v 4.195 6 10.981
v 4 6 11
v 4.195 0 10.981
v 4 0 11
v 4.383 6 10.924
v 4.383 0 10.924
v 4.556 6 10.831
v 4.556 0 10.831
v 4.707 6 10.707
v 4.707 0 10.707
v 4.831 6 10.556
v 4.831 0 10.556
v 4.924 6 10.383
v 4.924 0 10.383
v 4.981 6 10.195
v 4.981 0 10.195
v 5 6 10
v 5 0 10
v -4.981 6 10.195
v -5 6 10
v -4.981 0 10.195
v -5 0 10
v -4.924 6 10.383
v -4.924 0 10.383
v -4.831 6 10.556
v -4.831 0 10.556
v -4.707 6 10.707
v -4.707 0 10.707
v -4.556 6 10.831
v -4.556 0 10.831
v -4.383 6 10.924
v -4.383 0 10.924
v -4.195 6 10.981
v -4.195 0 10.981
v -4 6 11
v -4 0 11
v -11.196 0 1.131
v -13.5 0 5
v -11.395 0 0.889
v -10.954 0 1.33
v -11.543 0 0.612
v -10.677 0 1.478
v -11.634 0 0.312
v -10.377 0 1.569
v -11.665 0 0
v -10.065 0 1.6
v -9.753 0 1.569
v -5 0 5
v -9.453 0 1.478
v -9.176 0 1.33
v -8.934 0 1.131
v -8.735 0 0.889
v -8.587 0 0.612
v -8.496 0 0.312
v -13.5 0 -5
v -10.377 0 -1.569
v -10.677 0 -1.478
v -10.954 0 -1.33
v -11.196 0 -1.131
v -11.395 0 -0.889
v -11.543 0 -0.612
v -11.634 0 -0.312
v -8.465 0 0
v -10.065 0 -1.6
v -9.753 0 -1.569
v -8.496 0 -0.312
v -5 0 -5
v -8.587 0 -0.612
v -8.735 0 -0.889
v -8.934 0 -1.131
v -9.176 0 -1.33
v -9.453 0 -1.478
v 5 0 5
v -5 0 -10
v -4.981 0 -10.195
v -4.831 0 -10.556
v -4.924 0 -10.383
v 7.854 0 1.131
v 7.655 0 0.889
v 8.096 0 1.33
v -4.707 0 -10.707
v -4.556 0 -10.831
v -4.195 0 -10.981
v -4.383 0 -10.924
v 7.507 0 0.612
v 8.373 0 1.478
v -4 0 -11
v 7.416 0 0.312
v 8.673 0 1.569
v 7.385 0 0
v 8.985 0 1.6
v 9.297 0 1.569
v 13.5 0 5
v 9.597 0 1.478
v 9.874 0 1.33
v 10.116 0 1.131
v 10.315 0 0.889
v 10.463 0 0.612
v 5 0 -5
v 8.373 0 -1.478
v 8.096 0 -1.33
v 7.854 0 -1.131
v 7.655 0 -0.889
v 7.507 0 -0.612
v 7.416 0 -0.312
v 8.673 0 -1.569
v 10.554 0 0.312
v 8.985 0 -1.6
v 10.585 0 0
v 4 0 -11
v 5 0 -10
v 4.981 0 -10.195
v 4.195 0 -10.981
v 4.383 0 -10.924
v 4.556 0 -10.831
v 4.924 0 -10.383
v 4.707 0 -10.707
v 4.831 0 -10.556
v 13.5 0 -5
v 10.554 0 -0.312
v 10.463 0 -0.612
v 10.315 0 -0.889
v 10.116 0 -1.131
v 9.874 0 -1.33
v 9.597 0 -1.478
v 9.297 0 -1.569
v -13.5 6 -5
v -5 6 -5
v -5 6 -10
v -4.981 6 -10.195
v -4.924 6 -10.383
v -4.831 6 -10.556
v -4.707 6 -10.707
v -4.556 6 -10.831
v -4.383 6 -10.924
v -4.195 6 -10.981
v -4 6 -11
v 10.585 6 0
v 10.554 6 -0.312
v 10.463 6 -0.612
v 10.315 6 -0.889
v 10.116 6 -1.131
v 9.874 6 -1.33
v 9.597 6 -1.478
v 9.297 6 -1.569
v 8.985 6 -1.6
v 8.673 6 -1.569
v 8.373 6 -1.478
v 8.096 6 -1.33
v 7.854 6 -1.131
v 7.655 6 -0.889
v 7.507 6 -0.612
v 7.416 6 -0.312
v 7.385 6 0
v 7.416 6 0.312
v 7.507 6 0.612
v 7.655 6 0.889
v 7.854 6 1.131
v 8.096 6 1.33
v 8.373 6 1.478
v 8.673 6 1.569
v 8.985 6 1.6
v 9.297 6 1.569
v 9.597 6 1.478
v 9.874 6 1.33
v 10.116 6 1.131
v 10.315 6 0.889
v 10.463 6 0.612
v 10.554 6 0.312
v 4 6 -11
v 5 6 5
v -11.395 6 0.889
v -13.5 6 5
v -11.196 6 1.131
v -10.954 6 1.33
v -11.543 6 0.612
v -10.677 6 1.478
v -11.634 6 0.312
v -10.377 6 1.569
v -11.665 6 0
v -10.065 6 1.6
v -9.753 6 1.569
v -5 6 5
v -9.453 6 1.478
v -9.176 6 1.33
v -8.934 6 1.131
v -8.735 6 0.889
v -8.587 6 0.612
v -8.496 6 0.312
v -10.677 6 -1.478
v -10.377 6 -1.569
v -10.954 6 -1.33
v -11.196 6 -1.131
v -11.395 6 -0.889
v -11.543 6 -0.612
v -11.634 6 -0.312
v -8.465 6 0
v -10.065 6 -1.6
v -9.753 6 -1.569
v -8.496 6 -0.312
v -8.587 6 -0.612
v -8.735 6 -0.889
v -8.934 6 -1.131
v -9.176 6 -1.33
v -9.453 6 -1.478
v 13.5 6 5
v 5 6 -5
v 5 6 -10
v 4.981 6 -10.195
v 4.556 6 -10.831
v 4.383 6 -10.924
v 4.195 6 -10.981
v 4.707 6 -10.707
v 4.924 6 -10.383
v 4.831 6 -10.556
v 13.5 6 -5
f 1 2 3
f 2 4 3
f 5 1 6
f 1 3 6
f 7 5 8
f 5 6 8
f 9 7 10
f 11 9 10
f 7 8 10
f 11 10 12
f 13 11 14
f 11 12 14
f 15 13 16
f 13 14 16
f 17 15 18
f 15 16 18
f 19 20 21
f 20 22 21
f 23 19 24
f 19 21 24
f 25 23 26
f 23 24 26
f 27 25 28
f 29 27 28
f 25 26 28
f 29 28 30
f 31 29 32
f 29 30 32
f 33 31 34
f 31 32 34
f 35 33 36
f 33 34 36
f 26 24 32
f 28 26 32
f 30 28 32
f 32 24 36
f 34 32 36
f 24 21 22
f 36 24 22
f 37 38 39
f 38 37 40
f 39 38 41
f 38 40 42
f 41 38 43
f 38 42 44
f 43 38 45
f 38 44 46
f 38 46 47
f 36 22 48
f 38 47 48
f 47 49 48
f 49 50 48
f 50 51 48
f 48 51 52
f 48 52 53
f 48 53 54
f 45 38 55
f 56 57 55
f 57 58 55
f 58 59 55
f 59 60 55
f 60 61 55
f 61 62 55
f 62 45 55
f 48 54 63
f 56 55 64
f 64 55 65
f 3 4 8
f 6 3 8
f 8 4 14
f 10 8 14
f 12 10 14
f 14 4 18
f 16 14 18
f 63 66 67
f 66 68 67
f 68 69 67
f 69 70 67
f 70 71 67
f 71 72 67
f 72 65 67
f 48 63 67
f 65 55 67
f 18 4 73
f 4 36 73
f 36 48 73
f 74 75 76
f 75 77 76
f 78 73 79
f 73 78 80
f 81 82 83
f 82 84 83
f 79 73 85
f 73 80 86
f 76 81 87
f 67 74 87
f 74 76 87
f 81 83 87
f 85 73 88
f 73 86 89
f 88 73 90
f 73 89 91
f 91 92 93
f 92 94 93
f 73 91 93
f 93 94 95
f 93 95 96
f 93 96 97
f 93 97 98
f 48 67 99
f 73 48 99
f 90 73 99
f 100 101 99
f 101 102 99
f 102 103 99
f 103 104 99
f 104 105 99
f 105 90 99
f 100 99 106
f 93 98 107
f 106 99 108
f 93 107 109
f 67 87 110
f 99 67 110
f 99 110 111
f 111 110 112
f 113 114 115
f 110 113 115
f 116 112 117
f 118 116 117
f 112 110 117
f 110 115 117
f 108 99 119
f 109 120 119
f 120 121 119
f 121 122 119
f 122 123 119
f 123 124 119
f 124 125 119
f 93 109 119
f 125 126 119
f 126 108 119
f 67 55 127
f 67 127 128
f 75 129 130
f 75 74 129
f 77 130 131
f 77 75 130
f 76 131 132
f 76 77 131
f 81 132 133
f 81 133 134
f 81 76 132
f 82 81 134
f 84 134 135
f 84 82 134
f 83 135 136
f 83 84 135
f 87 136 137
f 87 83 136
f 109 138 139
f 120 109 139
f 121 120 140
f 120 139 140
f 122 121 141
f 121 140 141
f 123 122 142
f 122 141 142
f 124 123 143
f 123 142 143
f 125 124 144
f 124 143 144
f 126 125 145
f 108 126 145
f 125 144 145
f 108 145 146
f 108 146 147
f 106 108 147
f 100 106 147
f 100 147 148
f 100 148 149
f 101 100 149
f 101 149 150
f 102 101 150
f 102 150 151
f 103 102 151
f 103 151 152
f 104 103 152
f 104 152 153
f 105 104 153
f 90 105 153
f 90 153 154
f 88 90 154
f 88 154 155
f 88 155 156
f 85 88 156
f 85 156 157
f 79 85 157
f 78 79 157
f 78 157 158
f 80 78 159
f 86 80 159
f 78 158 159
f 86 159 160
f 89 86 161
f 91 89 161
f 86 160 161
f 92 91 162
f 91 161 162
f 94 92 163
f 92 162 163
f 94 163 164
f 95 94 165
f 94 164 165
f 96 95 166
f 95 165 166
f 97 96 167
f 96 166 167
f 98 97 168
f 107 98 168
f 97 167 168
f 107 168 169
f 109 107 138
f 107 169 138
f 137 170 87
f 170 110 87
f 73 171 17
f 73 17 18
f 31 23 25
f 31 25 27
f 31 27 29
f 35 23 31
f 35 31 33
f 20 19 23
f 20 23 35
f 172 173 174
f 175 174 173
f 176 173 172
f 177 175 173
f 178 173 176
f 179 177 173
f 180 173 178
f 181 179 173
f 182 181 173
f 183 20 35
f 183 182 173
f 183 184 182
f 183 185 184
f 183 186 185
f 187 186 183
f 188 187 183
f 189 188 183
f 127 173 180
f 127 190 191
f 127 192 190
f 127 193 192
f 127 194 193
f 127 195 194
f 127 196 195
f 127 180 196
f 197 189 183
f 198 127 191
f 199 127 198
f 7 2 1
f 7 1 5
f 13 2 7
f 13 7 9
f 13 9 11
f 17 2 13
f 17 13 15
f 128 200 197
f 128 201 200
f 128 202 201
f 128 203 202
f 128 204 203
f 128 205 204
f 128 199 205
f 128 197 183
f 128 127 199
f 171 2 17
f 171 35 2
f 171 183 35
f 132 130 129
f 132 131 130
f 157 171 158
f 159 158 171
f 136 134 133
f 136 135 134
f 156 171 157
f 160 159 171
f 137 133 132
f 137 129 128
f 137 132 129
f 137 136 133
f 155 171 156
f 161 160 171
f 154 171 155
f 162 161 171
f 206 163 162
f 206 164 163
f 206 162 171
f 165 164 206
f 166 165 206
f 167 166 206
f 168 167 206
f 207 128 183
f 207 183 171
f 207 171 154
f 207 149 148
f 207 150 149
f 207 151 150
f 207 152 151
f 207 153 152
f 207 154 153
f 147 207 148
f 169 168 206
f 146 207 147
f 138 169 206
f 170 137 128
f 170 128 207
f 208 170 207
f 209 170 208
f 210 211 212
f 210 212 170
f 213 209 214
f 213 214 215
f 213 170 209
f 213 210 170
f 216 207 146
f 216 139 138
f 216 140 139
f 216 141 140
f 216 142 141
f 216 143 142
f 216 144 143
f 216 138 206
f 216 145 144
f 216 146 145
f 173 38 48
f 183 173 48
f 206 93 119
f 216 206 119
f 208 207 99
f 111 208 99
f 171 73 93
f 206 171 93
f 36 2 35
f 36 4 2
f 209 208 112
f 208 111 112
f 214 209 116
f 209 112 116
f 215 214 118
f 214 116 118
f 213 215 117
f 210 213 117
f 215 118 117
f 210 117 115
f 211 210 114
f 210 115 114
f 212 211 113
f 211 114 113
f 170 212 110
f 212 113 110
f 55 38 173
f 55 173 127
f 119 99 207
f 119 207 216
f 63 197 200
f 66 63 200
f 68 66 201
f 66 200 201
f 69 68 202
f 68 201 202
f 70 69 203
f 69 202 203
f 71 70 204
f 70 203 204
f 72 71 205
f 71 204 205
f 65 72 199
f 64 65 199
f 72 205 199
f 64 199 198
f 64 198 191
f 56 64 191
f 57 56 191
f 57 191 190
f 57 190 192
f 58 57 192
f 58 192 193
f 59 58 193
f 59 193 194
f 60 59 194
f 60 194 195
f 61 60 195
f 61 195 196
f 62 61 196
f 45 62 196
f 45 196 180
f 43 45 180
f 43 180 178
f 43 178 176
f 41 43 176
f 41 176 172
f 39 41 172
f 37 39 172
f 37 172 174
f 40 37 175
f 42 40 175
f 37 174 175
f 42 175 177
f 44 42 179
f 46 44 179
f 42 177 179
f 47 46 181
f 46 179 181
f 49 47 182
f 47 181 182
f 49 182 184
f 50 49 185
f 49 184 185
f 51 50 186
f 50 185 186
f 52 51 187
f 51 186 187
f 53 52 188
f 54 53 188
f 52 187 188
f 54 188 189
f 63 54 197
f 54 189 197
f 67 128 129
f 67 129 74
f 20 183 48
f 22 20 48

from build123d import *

# Parameters (mm, degrees)
SKETCH1_W              = 27
SKETCH1_H              = 10
BOSS_EXTRUDE1_DEPTH    = 6
M3_CLEARANCE_HOLE1_D   = 3.2
SKETCH234_W            = 10
SKETCH234_H            = 6
BOSS_EXTRUDE234_DEPTH  = 6
FILLET134_R            = 1
FILLET134_OF_MIRROR1_R = 1


with BuildPart() as part:
    # Sketch1 → Boss-Extrude1 (new body)
    with BuildSketch(Plane(origin=(0, 0, 0), x_dir=(1, 0, 0), z_dir=(0, 1, 0))):
        Rectangle(SKETCH1_W, SKETCH1_H)
    extrude(amount=BOSS_EXTRUDE1_DEPTH)

    # M3 Clearance Hole1 (through all)
    with Locations(Plane(origin=(0, 0, 0), x_dir=(-1, 0, 0), z_dir=(0, -1, 0))):
        with Locations((10.065, 0), (-8.985, 0)):
            Hole(M3_CLEARANCE_HOLE1_D / 2)

    # Sketch234 → Boss-Extrude234 (add)
    with BuildSketch(Plane(origin=(0.767778608, 6, 5), x_dir=(-1, 0, 0), z_dir=(0, 0, 1))):
        with Locations((0.767778608, 3)):
            Rectangle(SKETCH234_W, SKETCH234_H)
    boss_extrude234 = extrude(amount=BOSS_EXTRUDE234_DEPTH)

    # Fillet134
    fillet134_edges = [part.edges().sort_by_distance(p)[0] for p in [
        (5, 3, 11),
        (-5, 3, 11),
    ]]
    fillet(fillet134_edges, radius=FILLET134_R)

    # Mirror1: Boss-Extrude234 across plane
    add(boss_extrude234.mirror(Plane.XY))

    # Fillet134 of Mirror1
    fillet134_of_mirror1_edges = [part.edges().sort_by_distance(p)[0] for p in [
        (5, 3, -11),
        (-5, 3, -11),
    ]]
    fillet(fillet134_of_mirror1_edges, radius=FILLET134_OF_MIRROR1_R)


solid = part.part
